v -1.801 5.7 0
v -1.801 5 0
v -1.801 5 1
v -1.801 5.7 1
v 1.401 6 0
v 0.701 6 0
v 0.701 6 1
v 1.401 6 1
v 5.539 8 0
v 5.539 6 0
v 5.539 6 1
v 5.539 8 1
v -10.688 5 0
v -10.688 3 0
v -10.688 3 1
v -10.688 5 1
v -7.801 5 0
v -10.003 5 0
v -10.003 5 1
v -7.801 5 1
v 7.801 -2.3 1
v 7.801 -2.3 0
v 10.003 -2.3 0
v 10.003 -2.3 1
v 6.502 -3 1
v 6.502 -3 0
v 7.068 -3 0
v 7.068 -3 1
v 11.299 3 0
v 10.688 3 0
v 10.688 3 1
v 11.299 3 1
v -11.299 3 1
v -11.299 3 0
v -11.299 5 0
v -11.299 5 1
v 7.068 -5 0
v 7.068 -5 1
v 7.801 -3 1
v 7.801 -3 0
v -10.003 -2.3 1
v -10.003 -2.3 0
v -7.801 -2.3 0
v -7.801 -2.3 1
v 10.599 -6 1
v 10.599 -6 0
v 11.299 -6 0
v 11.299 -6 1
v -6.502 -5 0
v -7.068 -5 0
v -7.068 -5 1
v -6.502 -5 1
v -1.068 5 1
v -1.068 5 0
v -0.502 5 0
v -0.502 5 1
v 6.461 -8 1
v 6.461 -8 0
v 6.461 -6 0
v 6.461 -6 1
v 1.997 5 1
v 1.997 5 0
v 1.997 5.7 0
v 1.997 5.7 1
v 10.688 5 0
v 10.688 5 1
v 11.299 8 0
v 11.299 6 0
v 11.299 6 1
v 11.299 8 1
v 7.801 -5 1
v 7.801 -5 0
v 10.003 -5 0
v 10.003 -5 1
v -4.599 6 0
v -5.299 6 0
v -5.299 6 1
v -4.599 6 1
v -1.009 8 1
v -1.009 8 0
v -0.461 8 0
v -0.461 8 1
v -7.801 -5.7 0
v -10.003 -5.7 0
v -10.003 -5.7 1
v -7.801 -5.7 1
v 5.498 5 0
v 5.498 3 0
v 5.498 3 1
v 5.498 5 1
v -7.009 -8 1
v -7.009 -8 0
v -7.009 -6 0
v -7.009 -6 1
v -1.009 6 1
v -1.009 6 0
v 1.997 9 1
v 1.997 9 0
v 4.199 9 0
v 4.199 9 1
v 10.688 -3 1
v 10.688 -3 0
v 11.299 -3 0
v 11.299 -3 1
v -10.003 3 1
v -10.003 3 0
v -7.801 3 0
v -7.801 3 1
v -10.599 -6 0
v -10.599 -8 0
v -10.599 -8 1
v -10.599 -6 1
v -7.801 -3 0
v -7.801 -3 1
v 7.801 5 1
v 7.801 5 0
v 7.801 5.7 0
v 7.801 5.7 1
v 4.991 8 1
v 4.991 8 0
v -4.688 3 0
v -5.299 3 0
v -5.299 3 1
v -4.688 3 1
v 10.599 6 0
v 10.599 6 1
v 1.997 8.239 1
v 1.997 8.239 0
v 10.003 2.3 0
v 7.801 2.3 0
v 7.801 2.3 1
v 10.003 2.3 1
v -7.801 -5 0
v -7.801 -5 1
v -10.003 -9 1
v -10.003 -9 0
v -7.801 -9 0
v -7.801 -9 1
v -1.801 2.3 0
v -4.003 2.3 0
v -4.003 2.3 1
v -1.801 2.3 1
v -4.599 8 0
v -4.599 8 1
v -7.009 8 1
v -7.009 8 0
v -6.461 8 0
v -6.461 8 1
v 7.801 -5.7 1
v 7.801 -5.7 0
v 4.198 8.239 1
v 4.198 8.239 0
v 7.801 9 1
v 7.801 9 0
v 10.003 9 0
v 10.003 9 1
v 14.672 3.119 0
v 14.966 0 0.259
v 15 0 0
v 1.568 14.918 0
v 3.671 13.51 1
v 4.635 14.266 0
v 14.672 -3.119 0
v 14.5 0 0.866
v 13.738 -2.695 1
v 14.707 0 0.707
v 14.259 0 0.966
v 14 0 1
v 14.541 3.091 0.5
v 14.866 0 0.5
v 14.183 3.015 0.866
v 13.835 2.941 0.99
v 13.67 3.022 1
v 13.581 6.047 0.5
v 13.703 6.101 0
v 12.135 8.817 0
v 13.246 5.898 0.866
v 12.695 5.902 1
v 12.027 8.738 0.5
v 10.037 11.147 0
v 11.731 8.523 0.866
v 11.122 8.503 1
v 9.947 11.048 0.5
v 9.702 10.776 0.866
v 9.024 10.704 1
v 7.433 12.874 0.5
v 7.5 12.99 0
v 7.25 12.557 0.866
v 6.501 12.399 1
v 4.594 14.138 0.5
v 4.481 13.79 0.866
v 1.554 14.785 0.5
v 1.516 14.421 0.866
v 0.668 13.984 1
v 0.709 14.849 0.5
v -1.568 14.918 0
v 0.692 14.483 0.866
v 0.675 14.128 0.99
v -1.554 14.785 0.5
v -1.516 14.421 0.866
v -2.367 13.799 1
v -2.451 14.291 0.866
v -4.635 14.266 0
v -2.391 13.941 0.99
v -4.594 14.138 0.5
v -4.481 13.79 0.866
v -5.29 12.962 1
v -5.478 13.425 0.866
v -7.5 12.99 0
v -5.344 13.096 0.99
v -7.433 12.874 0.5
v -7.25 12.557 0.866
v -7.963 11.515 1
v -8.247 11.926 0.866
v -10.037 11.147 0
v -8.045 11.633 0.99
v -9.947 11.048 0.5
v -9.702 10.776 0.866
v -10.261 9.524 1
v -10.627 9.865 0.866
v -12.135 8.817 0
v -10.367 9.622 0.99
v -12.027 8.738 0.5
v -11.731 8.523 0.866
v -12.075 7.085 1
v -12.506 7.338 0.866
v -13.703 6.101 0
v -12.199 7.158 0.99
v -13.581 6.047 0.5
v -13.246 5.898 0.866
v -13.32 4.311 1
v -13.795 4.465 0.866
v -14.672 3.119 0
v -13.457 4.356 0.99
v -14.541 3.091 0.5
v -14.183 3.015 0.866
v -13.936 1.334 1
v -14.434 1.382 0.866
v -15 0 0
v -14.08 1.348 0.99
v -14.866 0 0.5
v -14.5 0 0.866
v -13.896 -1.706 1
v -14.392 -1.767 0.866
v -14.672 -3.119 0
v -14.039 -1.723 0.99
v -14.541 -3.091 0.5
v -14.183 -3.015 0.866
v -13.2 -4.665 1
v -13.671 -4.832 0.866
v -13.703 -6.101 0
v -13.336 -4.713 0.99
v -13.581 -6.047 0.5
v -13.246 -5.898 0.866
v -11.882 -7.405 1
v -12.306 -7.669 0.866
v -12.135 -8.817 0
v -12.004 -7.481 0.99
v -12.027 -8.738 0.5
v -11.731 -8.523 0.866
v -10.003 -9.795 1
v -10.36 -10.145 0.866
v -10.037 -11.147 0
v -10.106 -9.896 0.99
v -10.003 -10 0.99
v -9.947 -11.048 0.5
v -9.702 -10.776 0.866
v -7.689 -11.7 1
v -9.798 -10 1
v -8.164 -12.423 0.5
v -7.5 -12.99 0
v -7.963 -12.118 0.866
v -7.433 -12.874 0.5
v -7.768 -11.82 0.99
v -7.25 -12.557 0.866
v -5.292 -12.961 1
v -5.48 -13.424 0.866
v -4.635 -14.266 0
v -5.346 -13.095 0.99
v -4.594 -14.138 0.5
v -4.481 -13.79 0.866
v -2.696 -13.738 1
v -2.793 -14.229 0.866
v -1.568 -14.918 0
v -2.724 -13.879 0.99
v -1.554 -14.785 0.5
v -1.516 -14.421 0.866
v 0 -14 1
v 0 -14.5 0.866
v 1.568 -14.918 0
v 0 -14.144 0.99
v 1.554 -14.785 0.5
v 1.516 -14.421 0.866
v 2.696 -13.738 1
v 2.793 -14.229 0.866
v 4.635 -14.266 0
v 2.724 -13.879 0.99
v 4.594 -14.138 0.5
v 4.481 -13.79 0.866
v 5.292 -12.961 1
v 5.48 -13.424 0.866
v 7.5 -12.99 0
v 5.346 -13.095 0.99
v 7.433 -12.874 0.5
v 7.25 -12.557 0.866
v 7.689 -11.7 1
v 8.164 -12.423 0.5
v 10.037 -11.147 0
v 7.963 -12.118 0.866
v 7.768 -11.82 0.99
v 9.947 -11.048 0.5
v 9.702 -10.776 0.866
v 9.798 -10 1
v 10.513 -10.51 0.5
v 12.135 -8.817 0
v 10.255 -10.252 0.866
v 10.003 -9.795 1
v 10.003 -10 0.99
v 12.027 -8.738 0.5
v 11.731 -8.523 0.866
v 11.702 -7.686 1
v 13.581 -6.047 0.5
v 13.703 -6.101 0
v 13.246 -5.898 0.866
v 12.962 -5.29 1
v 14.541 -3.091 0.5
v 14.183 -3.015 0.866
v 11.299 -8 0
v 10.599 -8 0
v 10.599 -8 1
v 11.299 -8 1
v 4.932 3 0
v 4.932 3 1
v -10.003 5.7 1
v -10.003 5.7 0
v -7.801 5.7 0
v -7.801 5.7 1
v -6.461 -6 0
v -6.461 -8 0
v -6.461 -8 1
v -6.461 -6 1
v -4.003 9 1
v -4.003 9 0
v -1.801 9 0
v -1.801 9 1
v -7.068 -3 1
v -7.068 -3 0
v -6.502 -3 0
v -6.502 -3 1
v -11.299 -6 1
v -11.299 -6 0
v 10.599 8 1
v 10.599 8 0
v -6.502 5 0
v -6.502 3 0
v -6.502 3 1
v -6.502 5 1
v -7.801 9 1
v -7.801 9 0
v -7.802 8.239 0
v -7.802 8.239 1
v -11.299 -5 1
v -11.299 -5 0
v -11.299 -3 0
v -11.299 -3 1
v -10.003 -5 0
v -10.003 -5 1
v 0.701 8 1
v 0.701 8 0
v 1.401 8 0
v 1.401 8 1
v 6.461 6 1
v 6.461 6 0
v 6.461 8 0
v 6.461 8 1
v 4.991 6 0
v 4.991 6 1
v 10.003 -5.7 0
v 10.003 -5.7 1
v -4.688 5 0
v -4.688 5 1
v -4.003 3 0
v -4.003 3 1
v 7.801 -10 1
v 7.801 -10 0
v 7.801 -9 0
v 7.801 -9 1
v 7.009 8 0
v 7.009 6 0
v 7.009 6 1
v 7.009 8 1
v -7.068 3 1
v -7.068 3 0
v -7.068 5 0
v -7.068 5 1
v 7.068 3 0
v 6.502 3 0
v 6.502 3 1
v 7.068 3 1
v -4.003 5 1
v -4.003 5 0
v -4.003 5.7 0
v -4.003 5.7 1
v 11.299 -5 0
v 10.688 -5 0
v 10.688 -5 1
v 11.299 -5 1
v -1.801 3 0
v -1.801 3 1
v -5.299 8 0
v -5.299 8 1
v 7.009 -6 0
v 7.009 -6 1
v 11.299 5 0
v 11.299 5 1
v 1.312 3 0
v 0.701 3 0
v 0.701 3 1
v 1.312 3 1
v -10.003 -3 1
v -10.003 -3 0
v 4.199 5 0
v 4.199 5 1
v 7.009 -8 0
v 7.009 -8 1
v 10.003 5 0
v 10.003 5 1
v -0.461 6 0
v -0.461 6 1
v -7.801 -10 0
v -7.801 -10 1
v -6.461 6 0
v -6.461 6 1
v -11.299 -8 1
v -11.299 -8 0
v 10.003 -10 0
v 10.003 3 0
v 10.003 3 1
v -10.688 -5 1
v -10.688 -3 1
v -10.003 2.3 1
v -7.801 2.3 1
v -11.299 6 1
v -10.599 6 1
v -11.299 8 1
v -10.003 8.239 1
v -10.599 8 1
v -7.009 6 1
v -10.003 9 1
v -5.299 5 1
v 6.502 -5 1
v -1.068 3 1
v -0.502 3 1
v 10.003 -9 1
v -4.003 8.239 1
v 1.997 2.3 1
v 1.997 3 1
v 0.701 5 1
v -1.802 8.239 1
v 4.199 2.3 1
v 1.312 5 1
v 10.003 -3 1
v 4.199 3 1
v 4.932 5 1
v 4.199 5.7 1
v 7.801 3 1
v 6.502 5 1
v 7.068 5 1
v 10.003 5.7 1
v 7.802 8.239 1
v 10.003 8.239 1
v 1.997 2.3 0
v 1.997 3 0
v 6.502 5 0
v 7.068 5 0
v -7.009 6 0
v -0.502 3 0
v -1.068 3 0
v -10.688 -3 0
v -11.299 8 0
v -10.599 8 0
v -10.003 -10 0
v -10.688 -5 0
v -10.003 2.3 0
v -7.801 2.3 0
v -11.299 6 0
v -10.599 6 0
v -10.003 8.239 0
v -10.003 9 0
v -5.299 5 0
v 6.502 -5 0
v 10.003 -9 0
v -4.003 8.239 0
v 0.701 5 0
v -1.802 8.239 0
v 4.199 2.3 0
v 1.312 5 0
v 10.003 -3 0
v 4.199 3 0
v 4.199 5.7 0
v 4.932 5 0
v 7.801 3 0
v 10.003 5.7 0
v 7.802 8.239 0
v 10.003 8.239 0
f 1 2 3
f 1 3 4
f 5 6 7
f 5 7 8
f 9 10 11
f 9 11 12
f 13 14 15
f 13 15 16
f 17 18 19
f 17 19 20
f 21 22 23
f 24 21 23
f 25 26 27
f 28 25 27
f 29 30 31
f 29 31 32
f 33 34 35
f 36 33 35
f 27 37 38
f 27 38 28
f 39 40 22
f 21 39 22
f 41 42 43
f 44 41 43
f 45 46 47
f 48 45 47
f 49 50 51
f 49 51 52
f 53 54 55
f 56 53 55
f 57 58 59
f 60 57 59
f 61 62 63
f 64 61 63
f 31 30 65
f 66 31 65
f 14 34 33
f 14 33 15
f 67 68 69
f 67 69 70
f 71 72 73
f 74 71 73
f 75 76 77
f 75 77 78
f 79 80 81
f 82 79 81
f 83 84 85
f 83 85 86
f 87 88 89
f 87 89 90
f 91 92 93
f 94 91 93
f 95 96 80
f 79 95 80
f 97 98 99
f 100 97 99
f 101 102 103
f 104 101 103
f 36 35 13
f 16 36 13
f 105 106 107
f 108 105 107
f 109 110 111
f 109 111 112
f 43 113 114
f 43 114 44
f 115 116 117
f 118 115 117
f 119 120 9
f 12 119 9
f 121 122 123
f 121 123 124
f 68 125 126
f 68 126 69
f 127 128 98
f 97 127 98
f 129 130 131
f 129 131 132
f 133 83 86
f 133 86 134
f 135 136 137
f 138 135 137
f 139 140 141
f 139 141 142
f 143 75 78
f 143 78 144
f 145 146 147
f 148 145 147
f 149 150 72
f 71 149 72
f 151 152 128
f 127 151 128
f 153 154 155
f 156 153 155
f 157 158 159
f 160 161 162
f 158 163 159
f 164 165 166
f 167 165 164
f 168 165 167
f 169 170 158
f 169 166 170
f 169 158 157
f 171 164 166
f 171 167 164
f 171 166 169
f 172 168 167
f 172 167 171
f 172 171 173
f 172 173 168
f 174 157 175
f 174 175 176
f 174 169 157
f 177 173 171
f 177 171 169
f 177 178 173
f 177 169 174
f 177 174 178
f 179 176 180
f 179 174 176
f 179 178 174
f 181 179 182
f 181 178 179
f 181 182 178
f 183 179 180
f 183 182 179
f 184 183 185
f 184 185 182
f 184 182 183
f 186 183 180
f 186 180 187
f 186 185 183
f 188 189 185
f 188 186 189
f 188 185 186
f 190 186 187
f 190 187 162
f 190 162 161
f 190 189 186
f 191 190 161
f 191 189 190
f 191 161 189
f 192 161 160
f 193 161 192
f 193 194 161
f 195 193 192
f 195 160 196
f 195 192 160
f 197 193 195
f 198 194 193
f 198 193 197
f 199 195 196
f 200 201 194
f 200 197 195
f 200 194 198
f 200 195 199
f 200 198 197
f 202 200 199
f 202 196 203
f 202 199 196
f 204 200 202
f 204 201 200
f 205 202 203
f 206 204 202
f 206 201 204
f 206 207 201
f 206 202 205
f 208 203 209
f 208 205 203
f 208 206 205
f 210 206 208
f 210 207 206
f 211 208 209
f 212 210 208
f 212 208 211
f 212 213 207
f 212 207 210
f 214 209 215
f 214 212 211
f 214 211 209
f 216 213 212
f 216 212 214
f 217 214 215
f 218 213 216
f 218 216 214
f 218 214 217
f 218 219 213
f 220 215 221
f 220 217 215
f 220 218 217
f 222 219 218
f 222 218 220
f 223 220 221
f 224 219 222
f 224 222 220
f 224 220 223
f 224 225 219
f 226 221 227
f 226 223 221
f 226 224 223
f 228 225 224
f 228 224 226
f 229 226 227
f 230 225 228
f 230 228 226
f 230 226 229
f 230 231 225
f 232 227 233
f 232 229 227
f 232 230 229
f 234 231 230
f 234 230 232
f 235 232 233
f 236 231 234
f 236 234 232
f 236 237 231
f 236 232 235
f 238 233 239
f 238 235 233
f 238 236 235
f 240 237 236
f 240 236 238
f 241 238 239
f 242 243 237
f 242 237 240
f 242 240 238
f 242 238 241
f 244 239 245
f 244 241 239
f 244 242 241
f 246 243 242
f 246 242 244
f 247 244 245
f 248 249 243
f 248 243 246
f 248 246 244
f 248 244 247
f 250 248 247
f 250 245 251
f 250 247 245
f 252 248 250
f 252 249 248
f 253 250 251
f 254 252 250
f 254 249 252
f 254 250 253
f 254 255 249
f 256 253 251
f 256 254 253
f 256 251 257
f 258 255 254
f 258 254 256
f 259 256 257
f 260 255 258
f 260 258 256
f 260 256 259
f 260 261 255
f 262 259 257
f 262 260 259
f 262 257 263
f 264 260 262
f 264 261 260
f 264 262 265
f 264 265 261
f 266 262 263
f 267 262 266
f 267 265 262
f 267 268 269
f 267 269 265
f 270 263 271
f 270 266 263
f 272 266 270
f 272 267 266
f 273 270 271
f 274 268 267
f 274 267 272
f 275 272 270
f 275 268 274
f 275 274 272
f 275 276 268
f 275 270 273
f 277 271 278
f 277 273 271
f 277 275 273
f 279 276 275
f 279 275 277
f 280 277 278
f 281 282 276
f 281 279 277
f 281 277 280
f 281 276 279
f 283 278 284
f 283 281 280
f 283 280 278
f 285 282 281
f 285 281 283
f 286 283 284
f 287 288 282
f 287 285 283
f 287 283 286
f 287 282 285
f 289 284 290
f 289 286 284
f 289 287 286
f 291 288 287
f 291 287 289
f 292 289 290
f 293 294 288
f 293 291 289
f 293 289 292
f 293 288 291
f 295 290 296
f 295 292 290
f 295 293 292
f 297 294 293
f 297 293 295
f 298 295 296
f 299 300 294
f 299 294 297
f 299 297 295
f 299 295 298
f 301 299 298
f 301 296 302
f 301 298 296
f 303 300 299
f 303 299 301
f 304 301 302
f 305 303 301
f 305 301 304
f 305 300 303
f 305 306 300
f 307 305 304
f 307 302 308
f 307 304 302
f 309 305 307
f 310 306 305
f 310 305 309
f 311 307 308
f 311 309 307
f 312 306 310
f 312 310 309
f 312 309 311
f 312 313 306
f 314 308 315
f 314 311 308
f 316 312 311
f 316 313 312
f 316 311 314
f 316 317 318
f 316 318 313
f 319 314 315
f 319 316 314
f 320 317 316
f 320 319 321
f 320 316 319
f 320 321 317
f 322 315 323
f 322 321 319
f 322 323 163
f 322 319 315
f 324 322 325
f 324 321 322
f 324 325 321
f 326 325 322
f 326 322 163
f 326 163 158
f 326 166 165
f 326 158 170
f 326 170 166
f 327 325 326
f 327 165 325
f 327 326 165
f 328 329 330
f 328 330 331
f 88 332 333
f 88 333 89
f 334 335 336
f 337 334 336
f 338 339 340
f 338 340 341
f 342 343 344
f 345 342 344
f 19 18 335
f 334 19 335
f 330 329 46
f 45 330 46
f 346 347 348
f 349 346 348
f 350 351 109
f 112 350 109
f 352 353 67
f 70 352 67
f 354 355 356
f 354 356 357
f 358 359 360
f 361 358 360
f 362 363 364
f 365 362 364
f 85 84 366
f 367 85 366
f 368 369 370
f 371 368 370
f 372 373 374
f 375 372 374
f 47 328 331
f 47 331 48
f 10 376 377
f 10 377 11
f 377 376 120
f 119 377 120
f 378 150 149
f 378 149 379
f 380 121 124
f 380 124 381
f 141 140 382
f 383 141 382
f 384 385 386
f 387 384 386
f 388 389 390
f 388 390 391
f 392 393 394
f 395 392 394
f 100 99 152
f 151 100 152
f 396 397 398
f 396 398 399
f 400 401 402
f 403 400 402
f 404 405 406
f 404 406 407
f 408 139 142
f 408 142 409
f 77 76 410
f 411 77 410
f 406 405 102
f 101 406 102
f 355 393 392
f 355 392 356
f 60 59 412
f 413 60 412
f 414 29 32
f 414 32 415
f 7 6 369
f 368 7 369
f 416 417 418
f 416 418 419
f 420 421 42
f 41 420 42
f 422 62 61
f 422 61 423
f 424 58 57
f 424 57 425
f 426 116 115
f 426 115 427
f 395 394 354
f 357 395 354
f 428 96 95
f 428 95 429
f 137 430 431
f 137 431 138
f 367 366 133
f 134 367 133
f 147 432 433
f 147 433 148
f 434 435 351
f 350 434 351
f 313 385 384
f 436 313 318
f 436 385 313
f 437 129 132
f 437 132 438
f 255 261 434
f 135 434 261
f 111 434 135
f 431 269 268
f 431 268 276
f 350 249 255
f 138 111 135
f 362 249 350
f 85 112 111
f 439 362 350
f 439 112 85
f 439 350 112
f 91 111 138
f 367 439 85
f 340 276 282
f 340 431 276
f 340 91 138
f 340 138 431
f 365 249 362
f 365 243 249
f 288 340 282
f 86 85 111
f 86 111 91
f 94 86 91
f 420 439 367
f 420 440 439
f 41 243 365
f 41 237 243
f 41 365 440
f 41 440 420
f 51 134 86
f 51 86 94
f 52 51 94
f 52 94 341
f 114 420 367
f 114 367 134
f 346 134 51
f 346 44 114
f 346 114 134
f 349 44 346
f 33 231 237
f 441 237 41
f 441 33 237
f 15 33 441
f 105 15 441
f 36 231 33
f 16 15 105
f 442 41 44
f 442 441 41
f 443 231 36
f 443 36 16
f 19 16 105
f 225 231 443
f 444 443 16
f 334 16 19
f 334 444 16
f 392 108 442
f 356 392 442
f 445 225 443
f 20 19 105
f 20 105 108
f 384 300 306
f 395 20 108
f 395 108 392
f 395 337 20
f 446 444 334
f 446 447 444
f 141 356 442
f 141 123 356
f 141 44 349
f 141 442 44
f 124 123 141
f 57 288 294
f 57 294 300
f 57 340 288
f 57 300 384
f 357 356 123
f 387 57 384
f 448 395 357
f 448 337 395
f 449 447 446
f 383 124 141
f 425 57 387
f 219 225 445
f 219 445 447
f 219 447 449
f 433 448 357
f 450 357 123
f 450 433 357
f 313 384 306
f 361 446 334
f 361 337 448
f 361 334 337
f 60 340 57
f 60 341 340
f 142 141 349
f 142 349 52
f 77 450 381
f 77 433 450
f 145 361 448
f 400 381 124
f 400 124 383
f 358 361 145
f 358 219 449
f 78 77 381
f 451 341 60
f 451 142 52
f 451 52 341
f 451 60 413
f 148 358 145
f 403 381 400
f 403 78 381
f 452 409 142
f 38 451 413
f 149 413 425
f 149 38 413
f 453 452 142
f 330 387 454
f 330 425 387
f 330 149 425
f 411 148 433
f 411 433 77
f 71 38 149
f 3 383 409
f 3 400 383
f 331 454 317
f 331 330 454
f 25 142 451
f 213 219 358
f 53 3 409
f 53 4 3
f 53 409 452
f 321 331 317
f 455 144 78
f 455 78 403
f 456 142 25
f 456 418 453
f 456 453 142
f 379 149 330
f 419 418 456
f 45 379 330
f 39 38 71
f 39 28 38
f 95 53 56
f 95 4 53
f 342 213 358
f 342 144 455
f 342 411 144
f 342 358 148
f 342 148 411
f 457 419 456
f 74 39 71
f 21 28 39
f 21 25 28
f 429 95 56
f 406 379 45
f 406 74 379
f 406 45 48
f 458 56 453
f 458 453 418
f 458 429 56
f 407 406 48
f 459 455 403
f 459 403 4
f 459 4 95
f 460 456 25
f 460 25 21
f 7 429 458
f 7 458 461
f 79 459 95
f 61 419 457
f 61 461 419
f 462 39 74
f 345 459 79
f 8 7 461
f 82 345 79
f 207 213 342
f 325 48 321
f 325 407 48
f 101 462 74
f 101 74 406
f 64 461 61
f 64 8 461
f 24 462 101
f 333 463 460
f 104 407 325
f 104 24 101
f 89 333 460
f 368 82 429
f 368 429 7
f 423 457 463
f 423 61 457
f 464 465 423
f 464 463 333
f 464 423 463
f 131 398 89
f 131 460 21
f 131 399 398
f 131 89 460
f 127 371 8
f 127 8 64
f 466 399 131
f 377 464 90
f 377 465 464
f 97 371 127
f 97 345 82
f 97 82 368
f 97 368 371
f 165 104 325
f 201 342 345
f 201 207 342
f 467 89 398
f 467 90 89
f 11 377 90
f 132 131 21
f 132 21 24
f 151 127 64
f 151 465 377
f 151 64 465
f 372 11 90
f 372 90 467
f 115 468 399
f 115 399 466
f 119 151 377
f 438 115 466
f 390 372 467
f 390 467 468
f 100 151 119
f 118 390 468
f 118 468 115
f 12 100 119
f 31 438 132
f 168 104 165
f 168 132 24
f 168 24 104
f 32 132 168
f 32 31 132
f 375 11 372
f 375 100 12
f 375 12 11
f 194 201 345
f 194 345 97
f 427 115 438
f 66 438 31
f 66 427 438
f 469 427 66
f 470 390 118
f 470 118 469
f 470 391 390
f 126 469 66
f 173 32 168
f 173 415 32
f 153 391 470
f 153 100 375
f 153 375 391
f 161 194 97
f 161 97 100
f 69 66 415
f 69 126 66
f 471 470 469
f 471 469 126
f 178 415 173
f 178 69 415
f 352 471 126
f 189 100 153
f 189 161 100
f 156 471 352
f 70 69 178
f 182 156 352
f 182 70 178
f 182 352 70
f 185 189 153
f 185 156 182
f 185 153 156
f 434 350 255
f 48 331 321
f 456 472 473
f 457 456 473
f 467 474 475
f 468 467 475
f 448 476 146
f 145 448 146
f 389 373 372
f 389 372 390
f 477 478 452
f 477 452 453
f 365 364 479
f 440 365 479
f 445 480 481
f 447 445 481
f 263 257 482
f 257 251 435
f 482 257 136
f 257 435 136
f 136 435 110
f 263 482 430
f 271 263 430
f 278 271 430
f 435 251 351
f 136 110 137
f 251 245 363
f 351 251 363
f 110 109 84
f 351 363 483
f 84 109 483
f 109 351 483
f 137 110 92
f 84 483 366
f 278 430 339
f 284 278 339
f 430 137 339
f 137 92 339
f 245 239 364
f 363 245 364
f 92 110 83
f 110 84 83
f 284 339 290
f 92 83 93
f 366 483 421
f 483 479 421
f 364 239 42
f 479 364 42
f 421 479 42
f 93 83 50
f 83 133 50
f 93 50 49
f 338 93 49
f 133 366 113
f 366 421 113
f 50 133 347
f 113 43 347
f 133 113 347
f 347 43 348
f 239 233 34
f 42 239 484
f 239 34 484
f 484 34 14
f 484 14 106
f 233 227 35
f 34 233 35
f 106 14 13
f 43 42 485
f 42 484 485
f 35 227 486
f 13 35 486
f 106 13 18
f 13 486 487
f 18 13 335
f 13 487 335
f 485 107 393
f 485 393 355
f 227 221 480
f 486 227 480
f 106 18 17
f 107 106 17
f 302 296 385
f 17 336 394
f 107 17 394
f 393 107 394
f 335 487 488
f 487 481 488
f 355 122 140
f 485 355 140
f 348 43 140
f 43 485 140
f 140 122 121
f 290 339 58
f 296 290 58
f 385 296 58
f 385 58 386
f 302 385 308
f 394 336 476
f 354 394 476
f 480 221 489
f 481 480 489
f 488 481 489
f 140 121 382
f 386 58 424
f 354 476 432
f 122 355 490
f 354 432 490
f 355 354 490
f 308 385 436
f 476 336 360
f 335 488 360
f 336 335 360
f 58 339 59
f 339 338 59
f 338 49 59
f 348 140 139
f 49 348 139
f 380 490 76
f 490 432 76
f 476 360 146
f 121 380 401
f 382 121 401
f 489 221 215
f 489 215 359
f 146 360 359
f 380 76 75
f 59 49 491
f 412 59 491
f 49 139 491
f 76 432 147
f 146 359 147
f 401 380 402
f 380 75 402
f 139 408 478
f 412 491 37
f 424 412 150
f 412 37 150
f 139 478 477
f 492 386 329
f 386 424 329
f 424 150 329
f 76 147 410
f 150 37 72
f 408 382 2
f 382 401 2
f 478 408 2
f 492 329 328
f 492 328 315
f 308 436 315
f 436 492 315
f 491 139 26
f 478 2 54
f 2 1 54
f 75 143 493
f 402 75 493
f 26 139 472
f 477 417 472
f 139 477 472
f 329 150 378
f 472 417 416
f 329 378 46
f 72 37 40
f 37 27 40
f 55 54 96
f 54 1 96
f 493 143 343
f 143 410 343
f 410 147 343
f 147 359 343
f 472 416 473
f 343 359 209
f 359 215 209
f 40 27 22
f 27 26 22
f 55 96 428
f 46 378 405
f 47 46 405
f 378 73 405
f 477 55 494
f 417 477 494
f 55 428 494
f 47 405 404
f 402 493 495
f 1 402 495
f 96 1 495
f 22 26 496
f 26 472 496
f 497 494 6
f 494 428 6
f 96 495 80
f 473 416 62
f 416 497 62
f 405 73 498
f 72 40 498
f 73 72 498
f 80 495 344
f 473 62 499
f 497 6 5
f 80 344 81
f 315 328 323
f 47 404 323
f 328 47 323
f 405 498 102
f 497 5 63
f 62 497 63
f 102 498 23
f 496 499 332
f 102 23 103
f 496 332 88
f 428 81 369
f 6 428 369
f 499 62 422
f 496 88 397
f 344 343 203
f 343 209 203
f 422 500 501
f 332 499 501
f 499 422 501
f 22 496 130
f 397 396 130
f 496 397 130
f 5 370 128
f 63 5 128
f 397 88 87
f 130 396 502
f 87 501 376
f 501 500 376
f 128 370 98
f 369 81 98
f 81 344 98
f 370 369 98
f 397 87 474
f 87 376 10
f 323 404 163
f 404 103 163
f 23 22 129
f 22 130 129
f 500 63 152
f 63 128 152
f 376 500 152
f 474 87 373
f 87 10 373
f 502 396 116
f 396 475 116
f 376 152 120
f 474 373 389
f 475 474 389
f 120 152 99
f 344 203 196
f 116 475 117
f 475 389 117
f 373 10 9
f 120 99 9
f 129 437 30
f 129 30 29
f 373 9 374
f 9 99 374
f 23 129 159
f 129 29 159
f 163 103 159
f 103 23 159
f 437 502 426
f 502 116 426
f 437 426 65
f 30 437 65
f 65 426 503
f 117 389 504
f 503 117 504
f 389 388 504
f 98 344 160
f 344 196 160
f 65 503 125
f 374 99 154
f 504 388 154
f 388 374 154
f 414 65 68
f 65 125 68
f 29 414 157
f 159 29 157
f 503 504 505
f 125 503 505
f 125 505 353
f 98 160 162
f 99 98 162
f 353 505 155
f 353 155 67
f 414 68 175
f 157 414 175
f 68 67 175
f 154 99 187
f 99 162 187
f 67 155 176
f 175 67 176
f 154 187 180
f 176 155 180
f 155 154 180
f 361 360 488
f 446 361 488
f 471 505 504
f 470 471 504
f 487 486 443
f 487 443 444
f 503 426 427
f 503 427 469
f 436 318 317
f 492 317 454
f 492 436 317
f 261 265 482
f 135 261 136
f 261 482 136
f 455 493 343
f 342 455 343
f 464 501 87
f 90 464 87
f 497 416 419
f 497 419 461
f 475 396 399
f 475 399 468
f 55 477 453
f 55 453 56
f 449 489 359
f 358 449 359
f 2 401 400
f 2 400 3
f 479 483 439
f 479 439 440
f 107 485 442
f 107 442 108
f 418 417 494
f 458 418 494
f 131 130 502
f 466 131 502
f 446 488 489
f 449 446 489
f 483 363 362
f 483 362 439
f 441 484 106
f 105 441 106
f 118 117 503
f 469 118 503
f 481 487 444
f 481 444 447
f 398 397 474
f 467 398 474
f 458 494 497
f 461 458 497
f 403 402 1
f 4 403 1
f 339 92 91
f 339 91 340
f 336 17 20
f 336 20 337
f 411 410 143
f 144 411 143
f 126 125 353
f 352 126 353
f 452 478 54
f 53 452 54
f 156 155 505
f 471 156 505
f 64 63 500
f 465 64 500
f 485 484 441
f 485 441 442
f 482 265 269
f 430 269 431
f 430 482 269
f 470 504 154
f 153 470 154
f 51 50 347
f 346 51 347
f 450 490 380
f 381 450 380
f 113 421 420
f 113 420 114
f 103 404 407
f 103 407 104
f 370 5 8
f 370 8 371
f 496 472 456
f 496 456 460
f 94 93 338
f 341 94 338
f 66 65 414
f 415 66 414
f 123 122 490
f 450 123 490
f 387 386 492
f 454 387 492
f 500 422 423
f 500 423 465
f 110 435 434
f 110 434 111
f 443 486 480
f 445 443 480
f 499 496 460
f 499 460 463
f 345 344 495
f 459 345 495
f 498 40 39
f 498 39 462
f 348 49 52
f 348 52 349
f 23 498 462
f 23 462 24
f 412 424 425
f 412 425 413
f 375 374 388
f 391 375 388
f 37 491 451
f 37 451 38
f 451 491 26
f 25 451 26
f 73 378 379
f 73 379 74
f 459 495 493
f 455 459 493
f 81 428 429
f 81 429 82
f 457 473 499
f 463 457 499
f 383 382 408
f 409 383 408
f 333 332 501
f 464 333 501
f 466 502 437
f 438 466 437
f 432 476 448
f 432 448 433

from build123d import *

# Parameters (mm, degrees)
F0_R     = 15
F0_W     = 2.201593481
F0_H     = 1
F0_W_2   = 0.7
F0_H_2   = 2
F0_W_3   = 0.611269173
F0_H_3   = 0.7
F0_W_4   = 0.547691976
F0_W_5   = 0.5653050612
F1_DEPTH = 1


# Not quite as in the source:
# - a fillet or chamfer that OpenCascade refuses, or shapes differently, is made with other operations: its cross-section is extruded or revolved along the edge and cut away or added
# - a feature names something its author has since deleted; it is built from what else it names


with BuildPart() as f1:
    # F0 (on Top) → F1 (new body)
    with BuildSketch(Plane.XY):
        Circle(F0_R)
        with Locations((-8.9021953754, -9.5)):
            Rectangle(F0_W, F0_H, mode=Mode.SUBTRACT)
        with Locations((-10.9492010795, -7)):
            Rectangle(F0_W_2, F0_H_2, mode=Mode.SUBTRACT)
        with Locations((-10.9935664929, -4)):
            Rectangle(F0_W_3, F0_H_2, mode=Mode.SUBTRACT)
        with Locations((-8.9021953754, -5.35)):
            Rectangle(F0_W, F0_H_3, mode=Mode.SUBTRACT)
        with Locations((-8.9021953754, -2.65)):
            Rectangle(F0_W, F0_H_3, mode=Mode.SUBTRACT)
        with Locations((-6.7348206503, -7)):
            Rectangle(F0_W_4, F0_H_2, mode=Mode.SUBTRACT)
        with Locations((-6.7848820763, -4)):
            Rectangle(F0_W_5, F0_H_2, mode=Mode.SUBTRACT)
        with Locations((8.9021953754, -9.5)):
            Rectangle(F0_W, F0_H, mode=Mode.SUBTRACT)
        with Locations((6.7348206503, -7)):
            Rectangle(F0_W_4, F0_H_2, mode=Mode.SUBTRACT)
        with Locations((6.7848820763, -4)):
            Rectangle(F0_W_5, F0_H_2, mode=Mode.SUBTRACT)
        with Locations((10.9492010795, -7)):
            Rectangle(F0_W_2, F0_H_2, mode=Mode.SUBTRACT)
        with Locations((8.9021953754, -5.35)):
            Rectangle(F0_W, F0_H_3, mode=Mode.SUBTRACT)
        with Locations((10.9935664929, -4)):
            Rectangle(F0_W_3, F0_H_2, mode=Mode.SUBTRACT)
        with Locations((8.9021953754, -2.65)):
            Rectangle(F0_W, F0_H_3, mode=Mode.SUBTRACT)
        with Locations((-8.9021953754, 2.65)):
            Rectangle(F0_W, F0_H_3, mode=Mode.SUBTRACT)
        with Locations((-10.9935664929, 4)):
            Rectangle(F0_W_3, F0_H_2, mode=Mode.SUBTRACT)
        with Locations((-8.9021953754, 5.35)):
            Rectangle(F0_W, F0_H_3, mode=Mode.SUBTRACT)
        with Locations((-10.9492010795, 7)):
            Rectangle(F0_W_2, F0_H_2, mode=Mode.SUBTRACT)
        with Locations((-2.9021953754, 2.65)):
            Rectangle(F0_W, F0_H_3, mode=Mode.SUBTRACT)
        with Locations((-6.7848820763, 4)):
            Rectangle(F0_W_5, F0_H_2, mode=Mode.SUBTRACT)
        with Locations((-4.9935664929, 4)):
            Rectangle(F0_W_3, F0_H_2, mode=Mode.SUBTRACT)
        with Locations((-6.7348206503, 7)):
            Rectangle(F0_W_4, F0_H_2, mode=Mode.SUBTRACT)
        with Locations((-4.9492010795, 7)):
            Rectangle(F0_W_2, F0_H_2, mode=Mode.SUBTRACT)
        with Locations((-2.9021953754, 5.35)):
            Rectangle(F0_W, F0_H_3, mode=Mode.SUBTRACT)
        with Locations((-0.7848820763, 4)):
            Rectangle(F0_W_5, F0_H_2, mode=Mode.SUBTRACT)
        with Locations((-0.7348206503, 7)):
            Rectangle(F0_W_4, F0_H_2, mode=Mode.SUBTRACT)
        Polygon((-10.0029921159, 9), (-7.8013986349, 9), (-7.8024366548, 8.2387067378), (-10.0029921159, 8.2387067378), align=None, mode=Mode.SUBTRACT)
        Polygon((-1.8024366548, 8.2387067378), (-4.0029921159, 8.2387067378), (-4.0029921159, 9), (-1.8013986349, 9), align=None, mode=Mode.SUBTRACT)
        with Locations((3.0978046246, 2.65)):
            Rectangle(F0_W, F0_H_3, mode=Mode.SUBTRACT)
        with Locations((1.0064335071, 4)):
            Rectangle(F0_W_3, F0_H_2, mode=Mode.SUBTRACT)
        with Locations((3.0978046246, 5.35)):
            Rectangle(F0_W, F0_H_3, mode=Mode.SUBTRACT)
        with Locations((1.0507989205, 7)):
            Rectangle(F0_W_2, F0_H_2, mode=Mode.SUBTRACT)
        with Locations((5.2151179237, 4)):
            Rectangle(F0_W_5, F0_H_2, mode=Mode.SUBTRACT)
        with Locations((6.7848820763, 4)):
            Rectangle(F0_W_5, F0_H_2, mode=Mode.SUBTRACT)
        with Locations((5.2651793497, 7)):
            Rectangle(F0_W_4, F0_H_2, mode=Mode.SUBTRACT)
        with Locations((6.7348206503, 7)):
            Rectangle(F0_W_4, F0_H_2, mode=Mode.SUBTRACT)
        with Locations((8.9021953754, 2.65)):
            Rectangle(F0_W, F0_H_3, mode=Mode.SUBTRACT)
        with Locations((8.9021953754, 5.35)):
            Rectangle(F0_W, F0_H_3, mode=Mode.SUBTRACT)
        with Locations((10.9935664929, 4)):
            Rectangle(F0_W_3, F0_H_2, mode=Mode.SUBTRACT)
        with Locations((10.9492010795, 7)):
            Rectangle(F0_W_2, F0_H_2, mode=Mode.SUBTRACT)
        Polygon((4.1975633452, 8.2387067378), (1.9970078841, 8.2387067378), (1.9970078841, 9), (4.1986013651, 9), align=None, mode=Mode.SUBTRACT)
        Polygon((10.0029921159, 9), (10.0029921159, 8.2387067378), (7.8024366548, 8.2387067378), (7.8013986349, 9), align=None, mode=Mode.SUBTRACT)
    extrude(amount=F1_DEPTH)

    # F2: fillet of radius 1 on 1 edges, made by hand

    # F2_s1 → F2_t2 (revolve, cut)
    with BuildSketch(Plane.XZ):
        with BuildLine():
            ThreePointArc((15, 0), (14.7071067812, 0.7071067812), (14, 1))
            Line((14, 1), (15, 1))
            Line((15, 1), (15, 0))
        make_face()
    revolve(axis=Axis((0, 0, 1), (0, 0, 1)), mode=Mode.SUBTRACT)


solid = f1.part
